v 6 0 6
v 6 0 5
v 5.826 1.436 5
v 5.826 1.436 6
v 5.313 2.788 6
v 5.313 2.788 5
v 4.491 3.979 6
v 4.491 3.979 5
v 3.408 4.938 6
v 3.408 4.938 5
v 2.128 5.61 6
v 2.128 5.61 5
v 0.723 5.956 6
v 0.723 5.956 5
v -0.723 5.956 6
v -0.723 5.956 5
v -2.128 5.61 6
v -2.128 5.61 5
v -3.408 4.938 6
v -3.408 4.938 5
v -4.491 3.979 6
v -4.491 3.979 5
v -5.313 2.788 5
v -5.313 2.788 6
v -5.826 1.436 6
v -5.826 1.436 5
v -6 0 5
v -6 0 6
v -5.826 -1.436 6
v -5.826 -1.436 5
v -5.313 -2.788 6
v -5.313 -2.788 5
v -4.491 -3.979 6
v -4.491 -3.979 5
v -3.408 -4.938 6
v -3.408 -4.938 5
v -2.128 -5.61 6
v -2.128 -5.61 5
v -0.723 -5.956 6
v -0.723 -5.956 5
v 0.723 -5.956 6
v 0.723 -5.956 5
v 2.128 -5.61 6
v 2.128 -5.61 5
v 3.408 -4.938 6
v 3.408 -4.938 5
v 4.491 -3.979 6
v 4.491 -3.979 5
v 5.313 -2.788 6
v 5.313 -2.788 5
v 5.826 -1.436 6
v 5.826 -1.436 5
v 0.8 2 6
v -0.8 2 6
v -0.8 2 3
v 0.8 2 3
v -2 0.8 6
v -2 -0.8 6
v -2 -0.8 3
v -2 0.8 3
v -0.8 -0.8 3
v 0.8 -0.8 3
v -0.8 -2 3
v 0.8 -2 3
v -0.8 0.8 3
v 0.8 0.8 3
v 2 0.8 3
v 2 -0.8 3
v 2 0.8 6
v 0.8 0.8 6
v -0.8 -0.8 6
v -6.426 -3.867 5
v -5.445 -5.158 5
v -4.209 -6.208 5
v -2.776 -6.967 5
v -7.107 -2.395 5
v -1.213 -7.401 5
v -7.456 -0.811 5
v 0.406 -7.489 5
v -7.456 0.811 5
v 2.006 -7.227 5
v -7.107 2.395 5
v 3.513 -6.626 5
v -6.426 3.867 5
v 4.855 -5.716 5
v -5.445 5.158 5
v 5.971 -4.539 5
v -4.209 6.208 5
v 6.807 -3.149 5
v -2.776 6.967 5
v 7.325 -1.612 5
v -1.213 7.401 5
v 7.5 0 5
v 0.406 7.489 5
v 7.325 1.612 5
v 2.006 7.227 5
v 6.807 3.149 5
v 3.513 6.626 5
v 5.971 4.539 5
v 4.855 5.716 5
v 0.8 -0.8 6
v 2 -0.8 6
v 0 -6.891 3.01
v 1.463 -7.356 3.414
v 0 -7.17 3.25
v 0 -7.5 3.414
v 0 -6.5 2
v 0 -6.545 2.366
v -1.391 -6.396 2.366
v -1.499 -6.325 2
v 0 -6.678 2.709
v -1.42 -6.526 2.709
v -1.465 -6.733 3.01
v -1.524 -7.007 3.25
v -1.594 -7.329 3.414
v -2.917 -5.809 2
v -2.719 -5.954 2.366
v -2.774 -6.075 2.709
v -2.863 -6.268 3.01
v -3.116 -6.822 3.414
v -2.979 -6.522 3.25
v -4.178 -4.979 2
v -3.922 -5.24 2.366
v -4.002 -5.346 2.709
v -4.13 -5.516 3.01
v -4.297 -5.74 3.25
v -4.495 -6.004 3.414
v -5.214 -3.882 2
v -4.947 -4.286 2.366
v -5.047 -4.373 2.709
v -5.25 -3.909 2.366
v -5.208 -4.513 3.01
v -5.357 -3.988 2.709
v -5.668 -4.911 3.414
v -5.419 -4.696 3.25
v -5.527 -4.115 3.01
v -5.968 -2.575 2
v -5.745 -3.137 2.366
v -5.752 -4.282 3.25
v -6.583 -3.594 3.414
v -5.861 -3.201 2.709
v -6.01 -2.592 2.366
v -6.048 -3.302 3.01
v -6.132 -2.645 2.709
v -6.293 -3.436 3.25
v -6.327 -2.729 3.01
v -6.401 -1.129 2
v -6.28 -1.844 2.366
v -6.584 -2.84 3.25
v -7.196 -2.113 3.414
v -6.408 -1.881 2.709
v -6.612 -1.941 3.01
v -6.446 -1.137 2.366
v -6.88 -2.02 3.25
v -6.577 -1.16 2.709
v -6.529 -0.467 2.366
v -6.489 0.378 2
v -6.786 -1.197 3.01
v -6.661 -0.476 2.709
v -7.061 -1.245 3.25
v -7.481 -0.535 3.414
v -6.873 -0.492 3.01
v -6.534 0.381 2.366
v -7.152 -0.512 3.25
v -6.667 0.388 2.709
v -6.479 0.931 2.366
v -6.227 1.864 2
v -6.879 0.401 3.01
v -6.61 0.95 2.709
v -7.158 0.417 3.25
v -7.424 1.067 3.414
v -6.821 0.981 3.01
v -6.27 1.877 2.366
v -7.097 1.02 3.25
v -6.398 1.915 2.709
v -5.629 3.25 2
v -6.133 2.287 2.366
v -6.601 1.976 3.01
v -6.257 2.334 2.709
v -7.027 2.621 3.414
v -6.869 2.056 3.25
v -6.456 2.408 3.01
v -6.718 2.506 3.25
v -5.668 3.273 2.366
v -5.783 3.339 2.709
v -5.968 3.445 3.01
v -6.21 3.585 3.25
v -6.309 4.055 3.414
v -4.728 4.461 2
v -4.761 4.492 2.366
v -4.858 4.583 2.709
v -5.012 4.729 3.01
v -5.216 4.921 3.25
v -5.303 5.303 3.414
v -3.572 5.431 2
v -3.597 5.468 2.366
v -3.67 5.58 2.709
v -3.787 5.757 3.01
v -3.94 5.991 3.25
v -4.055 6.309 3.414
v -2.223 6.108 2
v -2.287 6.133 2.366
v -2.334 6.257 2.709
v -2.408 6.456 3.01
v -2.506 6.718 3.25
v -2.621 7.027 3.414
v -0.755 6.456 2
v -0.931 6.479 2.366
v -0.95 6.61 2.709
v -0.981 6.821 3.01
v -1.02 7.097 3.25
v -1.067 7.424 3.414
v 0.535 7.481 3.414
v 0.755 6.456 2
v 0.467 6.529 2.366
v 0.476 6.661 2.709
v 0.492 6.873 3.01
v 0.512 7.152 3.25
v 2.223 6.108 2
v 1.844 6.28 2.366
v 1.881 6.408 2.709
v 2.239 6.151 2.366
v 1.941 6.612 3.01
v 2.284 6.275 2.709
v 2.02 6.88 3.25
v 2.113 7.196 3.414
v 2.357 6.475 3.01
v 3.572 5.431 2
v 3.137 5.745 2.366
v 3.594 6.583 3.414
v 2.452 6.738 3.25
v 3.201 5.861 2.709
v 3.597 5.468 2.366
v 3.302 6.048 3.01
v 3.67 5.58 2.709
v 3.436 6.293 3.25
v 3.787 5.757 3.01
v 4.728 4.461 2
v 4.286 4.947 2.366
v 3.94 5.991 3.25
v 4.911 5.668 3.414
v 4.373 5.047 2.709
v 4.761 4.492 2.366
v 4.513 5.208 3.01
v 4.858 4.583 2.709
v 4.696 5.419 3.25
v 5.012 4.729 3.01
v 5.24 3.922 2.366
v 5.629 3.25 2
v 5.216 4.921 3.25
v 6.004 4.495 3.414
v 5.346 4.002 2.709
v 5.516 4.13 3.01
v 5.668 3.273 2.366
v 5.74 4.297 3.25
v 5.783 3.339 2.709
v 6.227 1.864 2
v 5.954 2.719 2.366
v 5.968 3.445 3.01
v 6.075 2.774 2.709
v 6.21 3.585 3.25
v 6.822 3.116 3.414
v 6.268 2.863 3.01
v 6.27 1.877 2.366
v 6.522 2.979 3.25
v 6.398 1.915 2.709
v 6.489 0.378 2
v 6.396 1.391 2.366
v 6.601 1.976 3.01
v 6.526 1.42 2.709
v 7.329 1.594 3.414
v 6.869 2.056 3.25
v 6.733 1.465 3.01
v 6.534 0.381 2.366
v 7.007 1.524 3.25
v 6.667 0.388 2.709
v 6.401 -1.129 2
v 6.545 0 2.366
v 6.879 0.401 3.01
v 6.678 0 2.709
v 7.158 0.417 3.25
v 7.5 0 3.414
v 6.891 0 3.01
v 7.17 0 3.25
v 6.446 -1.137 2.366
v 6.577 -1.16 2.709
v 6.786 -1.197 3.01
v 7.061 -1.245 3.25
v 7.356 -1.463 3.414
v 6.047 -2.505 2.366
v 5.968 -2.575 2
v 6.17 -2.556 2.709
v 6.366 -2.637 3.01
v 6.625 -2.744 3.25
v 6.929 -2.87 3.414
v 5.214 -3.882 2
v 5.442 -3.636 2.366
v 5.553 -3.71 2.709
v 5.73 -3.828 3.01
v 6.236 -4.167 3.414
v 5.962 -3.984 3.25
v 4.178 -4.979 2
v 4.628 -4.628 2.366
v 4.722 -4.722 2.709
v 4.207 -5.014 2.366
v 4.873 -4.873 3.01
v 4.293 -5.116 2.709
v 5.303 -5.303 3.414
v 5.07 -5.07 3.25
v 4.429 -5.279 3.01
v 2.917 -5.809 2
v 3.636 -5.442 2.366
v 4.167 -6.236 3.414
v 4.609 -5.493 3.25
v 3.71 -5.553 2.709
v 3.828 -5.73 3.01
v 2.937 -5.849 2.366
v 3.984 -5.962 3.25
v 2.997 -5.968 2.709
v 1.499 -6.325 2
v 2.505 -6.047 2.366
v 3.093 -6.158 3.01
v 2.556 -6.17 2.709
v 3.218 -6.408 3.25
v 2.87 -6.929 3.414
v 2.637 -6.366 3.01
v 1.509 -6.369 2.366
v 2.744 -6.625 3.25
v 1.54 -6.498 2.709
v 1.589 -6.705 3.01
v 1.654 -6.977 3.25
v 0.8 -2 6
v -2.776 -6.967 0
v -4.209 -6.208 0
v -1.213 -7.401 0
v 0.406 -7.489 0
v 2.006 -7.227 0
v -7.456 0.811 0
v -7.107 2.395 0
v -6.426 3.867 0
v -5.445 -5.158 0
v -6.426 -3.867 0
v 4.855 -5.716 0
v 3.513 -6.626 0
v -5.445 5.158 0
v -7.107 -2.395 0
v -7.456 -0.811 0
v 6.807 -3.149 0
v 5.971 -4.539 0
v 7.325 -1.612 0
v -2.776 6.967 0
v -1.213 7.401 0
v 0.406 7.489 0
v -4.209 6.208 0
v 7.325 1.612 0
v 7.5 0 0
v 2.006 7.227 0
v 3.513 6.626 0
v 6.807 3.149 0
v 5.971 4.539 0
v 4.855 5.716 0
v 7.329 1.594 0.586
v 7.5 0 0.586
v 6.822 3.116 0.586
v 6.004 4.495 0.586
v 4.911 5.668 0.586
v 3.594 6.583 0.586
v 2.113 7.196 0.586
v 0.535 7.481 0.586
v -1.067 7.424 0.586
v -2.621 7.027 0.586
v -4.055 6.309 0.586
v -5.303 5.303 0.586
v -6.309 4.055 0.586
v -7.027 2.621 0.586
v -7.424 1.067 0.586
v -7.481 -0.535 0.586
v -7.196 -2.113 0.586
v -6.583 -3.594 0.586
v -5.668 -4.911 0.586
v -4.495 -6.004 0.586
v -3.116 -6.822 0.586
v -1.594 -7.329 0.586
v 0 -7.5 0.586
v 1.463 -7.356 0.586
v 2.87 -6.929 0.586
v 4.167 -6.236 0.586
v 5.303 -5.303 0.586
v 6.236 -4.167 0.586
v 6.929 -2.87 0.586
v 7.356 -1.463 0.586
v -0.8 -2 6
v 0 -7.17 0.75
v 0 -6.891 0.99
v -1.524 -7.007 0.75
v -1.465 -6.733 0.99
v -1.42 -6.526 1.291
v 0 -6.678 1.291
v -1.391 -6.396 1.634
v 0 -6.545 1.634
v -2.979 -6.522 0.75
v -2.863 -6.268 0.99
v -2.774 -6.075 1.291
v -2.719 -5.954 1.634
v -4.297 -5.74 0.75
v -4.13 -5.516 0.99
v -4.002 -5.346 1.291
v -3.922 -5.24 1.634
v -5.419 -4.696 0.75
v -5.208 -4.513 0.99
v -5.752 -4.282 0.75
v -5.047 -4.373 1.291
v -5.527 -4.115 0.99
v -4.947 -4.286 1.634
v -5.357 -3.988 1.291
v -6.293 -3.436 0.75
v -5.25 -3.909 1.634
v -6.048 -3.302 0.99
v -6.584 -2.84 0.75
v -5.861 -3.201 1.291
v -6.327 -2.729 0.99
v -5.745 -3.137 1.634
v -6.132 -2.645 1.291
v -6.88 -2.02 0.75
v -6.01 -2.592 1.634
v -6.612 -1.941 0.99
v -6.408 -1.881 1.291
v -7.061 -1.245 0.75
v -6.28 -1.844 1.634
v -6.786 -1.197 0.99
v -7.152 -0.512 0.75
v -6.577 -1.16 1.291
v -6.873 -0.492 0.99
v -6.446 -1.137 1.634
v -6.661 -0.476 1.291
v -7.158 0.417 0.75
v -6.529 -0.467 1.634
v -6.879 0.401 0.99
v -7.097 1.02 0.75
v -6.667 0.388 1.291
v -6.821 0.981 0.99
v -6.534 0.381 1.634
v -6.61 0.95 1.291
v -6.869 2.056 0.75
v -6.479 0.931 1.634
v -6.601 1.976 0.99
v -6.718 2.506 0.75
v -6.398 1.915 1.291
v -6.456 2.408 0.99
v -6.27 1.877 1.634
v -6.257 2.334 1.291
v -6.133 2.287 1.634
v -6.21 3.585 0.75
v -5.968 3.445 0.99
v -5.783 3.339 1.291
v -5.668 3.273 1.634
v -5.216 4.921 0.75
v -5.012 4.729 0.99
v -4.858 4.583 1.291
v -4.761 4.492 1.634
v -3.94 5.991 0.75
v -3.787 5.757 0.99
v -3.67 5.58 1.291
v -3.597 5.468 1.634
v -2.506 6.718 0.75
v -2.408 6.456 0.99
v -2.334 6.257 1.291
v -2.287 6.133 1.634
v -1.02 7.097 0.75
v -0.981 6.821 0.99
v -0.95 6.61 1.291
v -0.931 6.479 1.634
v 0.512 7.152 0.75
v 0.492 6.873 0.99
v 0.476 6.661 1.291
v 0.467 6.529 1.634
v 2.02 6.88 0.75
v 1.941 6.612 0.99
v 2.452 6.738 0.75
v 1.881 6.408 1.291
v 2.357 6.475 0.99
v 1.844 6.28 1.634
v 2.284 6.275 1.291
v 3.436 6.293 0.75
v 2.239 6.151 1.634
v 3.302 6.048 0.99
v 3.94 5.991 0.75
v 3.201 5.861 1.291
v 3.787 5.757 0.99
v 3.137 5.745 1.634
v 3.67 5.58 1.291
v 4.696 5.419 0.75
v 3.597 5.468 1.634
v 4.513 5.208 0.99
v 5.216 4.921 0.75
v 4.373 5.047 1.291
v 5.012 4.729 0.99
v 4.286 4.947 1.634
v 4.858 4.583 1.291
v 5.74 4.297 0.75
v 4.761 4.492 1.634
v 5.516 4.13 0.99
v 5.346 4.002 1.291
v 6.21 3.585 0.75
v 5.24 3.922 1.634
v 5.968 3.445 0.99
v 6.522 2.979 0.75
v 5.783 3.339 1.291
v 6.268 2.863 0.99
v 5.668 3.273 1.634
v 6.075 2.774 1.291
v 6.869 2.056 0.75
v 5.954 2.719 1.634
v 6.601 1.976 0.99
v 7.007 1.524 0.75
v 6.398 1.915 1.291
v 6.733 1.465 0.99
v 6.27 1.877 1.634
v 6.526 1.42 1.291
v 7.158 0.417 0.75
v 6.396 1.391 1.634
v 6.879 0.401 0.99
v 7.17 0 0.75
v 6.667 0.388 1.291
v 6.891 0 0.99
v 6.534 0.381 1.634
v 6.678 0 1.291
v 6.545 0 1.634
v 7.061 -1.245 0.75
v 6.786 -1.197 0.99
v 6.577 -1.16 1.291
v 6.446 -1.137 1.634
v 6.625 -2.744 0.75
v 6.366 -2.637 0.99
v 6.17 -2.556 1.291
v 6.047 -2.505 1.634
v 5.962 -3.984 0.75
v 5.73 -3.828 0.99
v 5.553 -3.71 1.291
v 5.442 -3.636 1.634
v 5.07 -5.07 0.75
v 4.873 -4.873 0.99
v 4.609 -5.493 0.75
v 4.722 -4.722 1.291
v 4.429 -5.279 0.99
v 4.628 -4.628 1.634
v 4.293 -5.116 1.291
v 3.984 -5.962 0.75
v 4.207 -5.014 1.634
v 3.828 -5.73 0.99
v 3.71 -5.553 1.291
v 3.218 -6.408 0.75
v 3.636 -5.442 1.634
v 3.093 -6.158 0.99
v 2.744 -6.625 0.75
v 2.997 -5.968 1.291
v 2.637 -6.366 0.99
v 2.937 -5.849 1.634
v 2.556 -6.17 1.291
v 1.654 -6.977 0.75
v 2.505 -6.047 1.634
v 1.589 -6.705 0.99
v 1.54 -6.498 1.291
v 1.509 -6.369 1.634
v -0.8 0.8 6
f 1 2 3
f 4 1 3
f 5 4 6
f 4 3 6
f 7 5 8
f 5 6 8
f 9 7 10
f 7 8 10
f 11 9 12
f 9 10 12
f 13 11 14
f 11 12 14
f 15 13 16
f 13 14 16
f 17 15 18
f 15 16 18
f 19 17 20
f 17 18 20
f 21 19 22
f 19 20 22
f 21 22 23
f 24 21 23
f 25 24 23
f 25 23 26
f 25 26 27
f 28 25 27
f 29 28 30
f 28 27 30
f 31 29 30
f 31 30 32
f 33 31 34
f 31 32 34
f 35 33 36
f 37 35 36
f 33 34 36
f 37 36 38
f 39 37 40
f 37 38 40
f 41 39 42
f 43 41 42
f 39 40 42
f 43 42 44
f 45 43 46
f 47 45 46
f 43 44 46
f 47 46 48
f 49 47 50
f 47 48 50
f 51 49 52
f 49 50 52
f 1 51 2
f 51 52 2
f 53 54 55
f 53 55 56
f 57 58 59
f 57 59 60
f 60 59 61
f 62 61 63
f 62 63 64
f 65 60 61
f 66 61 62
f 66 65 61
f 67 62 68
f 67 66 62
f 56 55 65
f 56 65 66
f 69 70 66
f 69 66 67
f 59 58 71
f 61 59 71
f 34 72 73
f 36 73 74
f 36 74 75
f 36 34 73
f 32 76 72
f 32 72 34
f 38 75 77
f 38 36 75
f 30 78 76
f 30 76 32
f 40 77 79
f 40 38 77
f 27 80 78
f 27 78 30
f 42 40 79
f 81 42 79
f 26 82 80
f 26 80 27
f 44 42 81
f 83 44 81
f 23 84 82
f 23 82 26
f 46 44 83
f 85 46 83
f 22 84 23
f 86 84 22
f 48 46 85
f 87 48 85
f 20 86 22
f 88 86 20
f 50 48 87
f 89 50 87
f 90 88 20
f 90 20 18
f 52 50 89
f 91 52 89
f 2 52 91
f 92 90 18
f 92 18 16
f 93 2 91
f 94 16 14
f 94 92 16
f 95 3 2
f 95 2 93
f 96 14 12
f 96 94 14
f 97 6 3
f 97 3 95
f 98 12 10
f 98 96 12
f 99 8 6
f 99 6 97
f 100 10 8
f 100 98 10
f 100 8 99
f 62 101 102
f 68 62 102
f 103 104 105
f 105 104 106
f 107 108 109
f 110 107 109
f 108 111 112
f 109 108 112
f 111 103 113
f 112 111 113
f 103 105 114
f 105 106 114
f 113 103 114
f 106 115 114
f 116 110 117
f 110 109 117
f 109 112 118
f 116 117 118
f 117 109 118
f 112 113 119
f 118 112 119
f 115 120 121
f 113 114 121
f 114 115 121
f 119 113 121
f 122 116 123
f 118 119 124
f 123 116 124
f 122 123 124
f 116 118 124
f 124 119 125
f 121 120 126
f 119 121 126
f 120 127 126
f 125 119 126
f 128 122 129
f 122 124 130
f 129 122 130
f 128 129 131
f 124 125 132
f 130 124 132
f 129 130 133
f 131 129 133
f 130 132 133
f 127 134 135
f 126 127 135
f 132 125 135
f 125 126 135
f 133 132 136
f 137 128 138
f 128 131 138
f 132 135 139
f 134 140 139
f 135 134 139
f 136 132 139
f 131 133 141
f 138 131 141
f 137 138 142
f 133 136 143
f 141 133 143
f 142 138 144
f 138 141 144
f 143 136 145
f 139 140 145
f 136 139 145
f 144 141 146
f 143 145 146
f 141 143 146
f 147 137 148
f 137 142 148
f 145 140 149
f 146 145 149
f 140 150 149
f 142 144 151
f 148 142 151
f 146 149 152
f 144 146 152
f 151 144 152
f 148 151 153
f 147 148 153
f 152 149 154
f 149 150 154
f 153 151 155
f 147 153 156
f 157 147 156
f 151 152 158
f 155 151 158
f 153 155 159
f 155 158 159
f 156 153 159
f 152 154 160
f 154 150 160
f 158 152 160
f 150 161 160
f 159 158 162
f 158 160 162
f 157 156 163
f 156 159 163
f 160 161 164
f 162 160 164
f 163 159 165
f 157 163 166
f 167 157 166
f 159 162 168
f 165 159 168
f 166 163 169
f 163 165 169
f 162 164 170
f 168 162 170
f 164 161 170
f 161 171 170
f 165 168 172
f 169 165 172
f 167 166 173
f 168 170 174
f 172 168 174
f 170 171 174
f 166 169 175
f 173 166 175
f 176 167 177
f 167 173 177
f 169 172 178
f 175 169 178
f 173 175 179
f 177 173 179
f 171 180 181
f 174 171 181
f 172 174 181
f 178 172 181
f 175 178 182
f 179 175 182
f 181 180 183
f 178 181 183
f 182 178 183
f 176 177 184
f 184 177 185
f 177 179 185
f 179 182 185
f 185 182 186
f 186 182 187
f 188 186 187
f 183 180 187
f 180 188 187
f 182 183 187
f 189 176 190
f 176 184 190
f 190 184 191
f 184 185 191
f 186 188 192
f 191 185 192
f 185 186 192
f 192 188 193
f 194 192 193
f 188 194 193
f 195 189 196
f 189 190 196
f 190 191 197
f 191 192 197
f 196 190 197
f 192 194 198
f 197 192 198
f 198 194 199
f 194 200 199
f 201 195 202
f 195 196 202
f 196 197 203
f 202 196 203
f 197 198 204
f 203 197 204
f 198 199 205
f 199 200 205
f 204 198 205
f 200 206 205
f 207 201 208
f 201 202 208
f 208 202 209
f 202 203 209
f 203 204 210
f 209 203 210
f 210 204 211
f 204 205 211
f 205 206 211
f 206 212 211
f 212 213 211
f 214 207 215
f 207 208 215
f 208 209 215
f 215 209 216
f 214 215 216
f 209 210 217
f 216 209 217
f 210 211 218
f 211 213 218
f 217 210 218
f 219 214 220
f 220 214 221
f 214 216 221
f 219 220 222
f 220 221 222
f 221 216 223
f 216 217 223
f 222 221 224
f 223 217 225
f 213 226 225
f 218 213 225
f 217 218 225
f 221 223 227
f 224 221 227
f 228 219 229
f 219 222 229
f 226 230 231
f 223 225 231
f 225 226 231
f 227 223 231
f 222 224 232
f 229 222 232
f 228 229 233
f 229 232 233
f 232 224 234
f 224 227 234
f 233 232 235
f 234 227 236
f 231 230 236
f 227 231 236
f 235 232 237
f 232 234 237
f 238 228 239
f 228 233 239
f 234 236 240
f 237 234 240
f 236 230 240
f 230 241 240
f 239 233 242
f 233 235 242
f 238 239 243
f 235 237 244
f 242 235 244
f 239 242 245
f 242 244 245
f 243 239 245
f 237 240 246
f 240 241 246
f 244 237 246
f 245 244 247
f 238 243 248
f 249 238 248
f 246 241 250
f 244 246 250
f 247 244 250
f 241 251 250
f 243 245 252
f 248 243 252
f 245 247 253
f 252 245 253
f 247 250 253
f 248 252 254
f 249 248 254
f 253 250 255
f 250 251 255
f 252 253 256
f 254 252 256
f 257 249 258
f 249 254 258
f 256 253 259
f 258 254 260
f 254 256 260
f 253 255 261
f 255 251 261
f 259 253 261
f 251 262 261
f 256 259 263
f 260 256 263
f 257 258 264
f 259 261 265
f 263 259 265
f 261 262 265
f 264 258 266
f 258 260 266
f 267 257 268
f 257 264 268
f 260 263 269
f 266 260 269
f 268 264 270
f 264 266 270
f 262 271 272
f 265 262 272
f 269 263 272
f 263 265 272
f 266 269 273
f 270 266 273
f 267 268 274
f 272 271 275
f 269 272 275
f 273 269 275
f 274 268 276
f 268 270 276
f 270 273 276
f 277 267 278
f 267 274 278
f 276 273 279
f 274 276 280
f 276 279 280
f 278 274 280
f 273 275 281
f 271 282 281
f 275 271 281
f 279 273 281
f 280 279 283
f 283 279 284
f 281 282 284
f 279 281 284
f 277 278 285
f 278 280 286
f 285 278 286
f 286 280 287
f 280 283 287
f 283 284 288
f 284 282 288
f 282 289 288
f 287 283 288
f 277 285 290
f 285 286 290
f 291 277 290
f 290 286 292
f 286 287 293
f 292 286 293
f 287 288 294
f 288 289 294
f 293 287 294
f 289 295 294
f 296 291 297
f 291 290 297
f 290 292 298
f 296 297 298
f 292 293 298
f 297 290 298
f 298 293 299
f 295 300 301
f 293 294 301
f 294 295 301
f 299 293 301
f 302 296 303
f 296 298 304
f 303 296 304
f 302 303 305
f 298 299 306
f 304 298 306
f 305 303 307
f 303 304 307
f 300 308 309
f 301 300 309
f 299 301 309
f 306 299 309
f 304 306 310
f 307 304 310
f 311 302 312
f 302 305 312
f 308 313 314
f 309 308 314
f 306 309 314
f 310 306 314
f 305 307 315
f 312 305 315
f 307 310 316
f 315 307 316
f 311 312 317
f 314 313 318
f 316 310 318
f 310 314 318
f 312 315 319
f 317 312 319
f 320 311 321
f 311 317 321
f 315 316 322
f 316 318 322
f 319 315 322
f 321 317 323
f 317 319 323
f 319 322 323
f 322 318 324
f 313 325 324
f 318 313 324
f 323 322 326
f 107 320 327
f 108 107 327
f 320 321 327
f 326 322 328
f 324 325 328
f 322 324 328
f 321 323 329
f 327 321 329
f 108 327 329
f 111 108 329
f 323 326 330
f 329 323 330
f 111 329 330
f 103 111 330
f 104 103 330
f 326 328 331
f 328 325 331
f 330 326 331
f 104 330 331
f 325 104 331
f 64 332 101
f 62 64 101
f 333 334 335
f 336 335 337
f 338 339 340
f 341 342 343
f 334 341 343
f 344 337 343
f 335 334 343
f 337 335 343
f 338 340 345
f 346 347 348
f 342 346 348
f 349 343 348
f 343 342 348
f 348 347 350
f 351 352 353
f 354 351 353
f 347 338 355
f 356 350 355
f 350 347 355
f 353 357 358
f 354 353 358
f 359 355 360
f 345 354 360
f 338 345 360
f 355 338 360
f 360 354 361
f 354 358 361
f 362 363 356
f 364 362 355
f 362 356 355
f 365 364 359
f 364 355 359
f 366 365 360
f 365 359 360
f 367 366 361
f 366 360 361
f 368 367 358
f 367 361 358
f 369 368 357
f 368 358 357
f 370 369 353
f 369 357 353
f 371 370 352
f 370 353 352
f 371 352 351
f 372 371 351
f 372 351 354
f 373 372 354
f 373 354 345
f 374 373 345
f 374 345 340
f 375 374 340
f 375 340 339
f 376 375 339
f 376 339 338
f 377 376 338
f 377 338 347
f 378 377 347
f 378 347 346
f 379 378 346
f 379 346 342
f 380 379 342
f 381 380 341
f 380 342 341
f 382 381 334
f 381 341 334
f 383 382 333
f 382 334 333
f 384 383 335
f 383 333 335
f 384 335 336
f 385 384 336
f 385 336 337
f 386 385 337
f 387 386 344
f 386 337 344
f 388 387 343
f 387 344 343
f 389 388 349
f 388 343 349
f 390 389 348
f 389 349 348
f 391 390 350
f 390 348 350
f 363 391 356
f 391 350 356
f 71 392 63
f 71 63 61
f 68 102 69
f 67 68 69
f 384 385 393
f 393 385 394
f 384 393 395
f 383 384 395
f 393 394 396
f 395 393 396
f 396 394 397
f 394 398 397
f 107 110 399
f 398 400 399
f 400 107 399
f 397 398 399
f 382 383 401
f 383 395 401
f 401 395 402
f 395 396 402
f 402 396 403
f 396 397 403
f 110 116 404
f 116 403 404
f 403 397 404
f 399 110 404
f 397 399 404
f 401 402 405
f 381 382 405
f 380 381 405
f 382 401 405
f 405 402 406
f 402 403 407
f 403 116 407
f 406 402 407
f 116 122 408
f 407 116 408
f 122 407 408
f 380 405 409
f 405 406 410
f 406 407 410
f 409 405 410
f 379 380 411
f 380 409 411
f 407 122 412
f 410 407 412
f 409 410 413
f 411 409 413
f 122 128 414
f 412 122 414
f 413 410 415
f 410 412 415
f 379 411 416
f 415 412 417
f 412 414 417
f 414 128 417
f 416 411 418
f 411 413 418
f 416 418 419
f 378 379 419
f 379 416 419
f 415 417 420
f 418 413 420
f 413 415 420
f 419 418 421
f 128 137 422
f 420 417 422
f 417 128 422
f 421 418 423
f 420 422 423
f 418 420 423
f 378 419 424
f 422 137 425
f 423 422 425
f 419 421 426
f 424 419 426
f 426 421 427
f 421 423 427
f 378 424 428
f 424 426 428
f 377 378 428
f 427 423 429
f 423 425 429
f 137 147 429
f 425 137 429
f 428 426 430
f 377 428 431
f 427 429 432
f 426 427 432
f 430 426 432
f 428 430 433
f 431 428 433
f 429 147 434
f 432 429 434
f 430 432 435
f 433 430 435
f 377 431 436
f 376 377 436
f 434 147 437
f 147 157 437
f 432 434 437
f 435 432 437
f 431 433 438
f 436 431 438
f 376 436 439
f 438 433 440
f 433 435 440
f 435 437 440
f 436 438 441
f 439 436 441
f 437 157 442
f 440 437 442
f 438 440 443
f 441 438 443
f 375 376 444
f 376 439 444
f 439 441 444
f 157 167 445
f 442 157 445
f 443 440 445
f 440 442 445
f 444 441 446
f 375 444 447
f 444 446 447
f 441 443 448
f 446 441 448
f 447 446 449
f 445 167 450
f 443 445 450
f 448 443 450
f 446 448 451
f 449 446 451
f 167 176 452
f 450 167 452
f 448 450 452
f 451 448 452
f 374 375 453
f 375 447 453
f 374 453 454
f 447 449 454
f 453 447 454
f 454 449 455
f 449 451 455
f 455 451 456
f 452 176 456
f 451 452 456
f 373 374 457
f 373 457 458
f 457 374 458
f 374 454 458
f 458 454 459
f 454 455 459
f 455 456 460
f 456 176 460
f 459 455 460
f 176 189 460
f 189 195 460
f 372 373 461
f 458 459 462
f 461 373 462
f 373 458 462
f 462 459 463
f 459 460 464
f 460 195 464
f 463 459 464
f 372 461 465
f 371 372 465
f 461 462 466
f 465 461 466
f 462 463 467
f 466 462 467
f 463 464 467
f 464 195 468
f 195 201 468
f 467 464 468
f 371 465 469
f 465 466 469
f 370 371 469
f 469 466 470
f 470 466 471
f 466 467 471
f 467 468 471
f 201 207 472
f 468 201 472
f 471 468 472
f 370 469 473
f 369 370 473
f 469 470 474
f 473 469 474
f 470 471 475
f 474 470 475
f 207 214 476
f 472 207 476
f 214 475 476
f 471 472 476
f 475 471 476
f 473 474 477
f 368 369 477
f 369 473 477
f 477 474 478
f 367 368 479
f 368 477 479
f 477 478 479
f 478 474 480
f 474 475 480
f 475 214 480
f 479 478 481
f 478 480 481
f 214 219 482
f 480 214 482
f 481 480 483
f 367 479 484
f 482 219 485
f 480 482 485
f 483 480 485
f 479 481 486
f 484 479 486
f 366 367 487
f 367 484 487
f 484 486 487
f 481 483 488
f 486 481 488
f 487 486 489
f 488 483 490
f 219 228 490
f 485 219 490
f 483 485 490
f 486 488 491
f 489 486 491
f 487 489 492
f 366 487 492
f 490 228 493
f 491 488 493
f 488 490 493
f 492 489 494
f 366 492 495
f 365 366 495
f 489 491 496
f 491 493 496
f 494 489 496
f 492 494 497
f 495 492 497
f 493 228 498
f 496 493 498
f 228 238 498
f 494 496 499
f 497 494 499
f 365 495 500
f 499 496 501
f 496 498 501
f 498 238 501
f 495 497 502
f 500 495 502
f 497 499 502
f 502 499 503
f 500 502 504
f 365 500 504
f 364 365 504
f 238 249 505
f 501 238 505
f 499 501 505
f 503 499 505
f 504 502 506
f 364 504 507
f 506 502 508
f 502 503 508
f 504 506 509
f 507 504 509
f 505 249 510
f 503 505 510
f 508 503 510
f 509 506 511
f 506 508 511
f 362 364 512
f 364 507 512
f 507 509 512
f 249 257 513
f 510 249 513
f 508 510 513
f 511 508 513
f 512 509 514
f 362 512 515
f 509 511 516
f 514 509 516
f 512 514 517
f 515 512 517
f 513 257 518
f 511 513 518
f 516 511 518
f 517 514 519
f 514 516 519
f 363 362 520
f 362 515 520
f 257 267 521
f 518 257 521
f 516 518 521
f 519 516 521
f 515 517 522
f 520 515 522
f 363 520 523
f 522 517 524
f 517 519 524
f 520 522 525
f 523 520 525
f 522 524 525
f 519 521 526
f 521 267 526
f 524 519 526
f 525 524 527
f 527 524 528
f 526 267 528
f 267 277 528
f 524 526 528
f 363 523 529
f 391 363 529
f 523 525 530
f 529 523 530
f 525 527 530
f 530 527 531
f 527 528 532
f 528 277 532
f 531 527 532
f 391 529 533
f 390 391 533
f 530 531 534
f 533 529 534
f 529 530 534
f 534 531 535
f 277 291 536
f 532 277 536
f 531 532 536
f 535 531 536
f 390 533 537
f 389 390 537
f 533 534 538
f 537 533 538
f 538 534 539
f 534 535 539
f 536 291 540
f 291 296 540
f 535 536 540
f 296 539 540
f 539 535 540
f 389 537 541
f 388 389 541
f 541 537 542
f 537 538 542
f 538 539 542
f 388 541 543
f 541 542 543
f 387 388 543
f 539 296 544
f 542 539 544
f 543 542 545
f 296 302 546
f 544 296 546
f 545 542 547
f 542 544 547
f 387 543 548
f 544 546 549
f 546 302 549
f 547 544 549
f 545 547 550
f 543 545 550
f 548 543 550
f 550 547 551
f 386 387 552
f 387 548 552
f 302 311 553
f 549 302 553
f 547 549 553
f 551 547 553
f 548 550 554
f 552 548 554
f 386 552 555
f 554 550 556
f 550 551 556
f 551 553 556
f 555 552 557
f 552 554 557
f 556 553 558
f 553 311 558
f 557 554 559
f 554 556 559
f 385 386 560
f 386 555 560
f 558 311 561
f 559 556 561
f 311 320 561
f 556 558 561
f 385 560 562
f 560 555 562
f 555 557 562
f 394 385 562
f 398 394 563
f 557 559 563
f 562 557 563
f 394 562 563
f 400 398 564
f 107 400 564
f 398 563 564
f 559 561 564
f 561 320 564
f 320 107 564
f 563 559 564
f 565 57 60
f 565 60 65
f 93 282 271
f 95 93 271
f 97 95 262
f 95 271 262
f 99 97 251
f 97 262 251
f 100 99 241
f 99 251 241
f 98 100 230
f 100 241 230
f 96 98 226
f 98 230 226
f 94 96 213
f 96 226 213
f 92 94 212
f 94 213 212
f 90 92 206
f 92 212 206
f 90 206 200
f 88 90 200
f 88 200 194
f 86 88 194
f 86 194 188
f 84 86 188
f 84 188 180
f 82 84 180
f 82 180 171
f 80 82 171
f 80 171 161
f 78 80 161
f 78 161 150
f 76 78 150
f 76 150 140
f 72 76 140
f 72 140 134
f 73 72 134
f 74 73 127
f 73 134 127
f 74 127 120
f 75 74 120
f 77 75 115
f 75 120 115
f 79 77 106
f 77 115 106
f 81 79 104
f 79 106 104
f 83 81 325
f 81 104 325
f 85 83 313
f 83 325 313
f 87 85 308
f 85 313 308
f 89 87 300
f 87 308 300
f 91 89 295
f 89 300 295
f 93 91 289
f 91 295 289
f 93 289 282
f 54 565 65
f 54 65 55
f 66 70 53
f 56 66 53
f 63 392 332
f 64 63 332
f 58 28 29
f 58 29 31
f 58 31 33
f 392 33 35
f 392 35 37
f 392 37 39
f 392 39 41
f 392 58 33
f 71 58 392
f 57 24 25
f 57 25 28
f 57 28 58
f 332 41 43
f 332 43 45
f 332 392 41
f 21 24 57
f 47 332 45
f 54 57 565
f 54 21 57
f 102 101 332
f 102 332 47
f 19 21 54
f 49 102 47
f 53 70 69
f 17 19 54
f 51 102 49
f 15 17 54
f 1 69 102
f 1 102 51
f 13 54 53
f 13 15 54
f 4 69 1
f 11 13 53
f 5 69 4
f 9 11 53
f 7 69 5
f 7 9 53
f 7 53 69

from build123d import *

# Parameters (mm, degrees)
F0_R     = 7.5
F1_DEPTH = 5
F2_R     = 6
F3_DEPTH = 1
F4_W     = 1.6
F4_H     = 1.2
F4_W_2   = 1.2
F4_H_2   = 1.6
F5_DEPTH = 3
F7_R     = 1.5


with BuildPart() as f1:
    # F0 (on Top) → F1 (new body)
    with BuildSketch(Plane.XY):
        Circle(F0_R)
    extrude(amount=F1_DEPTH)

    # F2 (on face) → F3 (join)
    with BuildSketch(Plane.XY.offset(5)):
        Circle(F2_R)
    extrude(amount=F3_DEPTH)

    # F4 (on face) → F5 (cut)
    with BuildSketch(Plane.XY.offset(6)):
        with Locations((0, 1.4)):
            Rectangle(F4_W, F4_H)
        with Locations((-1.4, 0)):
            Rectangle(F4_W_2, F4_H_2)
        Rectangle(F4_W, F4_H_2)
        with Locations((1.4, 0)):
            Rectangle(F4_W_2, F4_H_2)
        with Locations((0, -1.4)):
            Rectangle(F4_W, F4_H)
    extrude(amount=-F5_DEPTH, mode=Mode.SUBTRACT)

    # F7 (on Right) → F8 (revolve, cut)
    with BuildSketch(Plane.YZ):
        with Locations((-8, 2)):
            Circle(F7_R)
    revolve(axis=Axis((0, 0, 2.2380100563), (0, 0, -1)), mode=Mode.SUBTRACT)


solid = f1.part
